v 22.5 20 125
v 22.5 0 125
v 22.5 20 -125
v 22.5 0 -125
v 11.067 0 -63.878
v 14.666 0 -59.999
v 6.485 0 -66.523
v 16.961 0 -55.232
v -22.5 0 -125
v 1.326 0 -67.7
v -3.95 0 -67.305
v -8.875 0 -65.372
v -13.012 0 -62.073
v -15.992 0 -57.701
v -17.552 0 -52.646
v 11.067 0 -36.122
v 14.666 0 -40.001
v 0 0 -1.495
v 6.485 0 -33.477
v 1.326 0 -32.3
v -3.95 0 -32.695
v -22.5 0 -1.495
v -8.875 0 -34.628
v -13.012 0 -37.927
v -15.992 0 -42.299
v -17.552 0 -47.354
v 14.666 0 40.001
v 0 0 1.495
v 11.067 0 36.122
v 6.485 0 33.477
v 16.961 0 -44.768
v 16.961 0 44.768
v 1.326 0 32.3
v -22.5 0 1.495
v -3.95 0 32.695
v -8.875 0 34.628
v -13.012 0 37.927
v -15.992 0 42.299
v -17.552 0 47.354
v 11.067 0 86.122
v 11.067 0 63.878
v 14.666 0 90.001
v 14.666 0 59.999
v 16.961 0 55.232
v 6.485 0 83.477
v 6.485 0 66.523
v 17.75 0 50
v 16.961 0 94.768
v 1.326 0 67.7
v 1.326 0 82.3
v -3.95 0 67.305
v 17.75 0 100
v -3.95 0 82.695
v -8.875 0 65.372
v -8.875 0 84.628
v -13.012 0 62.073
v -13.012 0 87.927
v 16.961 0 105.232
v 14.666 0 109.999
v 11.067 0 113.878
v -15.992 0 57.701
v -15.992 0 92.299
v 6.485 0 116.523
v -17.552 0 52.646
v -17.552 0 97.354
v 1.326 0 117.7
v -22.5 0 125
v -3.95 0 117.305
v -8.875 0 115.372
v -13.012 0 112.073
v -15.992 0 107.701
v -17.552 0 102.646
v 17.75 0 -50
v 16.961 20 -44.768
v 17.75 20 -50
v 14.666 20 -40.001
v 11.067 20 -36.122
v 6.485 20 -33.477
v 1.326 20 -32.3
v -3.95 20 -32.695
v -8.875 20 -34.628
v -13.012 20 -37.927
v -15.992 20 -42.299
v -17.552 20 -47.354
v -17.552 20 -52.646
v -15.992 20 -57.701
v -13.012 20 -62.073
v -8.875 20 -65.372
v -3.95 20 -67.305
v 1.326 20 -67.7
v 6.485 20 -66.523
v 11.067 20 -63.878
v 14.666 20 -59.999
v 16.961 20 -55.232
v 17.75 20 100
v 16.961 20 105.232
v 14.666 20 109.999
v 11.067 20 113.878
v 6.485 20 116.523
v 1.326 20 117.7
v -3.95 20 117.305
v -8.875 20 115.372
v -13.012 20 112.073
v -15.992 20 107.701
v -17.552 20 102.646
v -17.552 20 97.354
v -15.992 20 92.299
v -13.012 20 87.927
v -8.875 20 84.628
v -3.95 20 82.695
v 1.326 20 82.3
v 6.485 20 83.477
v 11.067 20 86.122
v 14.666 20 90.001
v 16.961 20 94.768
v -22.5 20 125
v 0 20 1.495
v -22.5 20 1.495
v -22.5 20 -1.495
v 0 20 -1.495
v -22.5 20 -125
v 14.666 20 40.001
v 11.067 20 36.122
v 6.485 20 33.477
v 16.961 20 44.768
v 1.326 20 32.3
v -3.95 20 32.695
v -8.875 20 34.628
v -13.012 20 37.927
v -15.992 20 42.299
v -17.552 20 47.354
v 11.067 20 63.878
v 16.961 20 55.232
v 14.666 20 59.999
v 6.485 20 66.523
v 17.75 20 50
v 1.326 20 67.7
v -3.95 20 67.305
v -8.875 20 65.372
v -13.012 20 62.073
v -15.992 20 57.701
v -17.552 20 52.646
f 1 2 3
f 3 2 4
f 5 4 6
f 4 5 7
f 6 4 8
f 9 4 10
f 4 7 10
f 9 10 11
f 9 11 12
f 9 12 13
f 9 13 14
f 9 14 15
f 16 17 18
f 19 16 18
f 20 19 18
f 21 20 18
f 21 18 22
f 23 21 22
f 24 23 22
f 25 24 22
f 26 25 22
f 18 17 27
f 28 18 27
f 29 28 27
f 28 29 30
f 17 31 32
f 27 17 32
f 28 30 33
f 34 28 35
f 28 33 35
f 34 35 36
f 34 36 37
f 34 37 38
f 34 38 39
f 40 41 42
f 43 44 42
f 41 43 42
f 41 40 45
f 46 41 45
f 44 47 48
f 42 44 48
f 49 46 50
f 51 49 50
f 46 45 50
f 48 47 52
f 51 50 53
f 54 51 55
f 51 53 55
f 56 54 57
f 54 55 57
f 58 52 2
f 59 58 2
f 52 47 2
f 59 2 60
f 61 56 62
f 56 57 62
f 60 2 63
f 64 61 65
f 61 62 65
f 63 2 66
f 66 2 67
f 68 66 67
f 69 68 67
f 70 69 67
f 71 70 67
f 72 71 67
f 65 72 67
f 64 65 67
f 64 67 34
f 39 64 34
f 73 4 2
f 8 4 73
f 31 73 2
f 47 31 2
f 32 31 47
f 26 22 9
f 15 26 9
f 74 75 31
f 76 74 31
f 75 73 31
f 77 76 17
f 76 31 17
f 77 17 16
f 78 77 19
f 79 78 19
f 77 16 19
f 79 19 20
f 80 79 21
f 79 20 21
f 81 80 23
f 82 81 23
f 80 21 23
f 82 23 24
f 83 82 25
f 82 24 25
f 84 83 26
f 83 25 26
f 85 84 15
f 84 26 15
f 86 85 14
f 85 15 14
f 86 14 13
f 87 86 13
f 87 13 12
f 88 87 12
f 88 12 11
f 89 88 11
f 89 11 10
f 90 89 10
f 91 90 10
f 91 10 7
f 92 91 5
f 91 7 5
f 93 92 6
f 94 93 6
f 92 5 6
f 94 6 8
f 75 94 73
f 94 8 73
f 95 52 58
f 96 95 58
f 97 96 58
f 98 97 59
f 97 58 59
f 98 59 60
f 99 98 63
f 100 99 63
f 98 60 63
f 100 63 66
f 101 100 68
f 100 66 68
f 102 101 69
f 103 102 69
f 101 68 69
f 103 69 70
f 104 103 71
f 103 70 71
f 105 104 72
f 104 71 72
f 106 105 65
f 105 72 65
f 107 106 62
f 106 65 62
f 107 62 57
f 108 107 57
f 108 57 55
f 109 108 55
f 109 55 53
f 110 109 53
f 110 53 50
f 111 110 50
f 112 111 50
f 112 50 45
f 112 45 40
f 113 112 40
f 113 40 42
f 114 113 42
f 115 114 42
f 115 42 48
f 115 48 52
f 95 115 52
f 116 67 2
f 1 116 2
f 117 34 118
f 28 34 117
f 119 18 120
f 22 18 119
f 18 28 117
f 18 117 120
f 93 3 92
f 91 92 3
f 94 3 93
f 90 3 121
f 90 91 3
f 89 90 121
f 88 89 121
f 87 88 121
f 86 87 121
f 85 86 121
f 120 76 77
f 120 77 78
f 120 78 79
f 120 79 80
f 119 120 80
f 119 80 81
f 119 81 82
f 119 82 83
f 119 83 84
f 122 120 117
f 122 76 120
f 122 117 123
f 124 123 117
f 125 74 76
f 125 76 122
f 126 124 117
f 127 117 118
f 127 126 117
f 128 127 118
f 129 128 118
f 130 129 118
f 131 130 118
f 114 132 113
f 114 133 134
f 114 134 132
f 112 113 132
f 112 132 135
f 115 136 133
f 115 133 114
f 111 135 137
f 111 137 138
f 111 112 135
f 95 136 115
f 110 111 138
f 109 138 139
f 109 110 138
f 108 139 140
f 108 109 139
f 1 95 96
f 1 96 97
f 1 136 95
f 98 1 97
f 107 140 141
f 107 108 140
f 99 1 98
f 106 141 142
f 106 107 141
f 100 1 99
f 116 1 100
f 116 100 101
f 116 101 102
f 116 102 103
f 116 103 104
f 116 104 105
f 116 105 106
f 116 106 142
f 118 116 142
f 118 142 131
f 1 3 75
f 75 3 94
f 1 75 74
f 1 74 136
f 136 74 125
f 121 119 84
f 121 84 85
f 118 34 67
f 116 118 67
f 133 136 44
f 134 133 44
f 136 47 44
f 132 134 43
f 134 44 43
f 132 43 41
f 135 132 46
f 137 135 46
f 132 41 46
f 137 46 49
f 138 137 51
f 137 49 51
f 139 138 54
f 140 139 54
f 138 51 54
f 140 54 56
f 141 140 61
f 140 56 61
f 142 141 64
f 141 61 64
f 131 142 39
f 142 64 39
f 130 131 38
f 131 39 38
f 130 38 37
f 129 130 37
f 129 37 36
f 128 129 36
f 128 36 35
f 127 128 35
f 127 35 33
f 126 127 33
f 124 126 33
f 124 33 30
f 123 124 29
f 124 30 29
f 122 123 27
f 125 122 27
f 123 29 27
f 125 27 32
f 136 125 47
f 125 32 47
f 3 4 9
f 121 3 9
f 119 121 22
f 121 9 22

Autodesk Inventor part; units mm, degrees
ref_plane "YZ Plane" through (0, 0, 0) normal (1, 0, 0) x (0, 1, 0)
ref_plane "XZ Plane" through (0, 0, 0) normal (0, 1, 0) x (-1, 0, 0)
ref_plane "XY Plane" through (0, 0, 0) normal (0, 0, 1) x (1, 0, 0)
sketch "Sketch1" plane through (0, 0, 0) normal (0, 1, 0) x (-1, 0, 0)
  line L0 (22.5, 125) -> (-22.5, 125)
  line L1 (-22.5, 125) -> (-22.5, -125)
  line L2 (-22.5, -125) -> (22.5, -125)
  line L3 (22.5, -125) -> (22.5, 125)
  line L4 (22.5, 125) -> (-22.5, -125) construction
  line L5 (-22.5, 125) -> (22.5, -125) construction
  point P0 (0, 0)
  dimension "d0" = 250
  dimension "d1" = 45
extrude "Extrusion1" add sketch "Sketch1" along normal blind 20
sketch "Sketch2" plane through (0, 0, 0) normal (0, -1, 0) x (1, 0, 0)
  circle A0 centre (0, 100) radius 17.75
  circle A1 centre (0, 50) radius 17.75
  circle A2 centre (0, -50) radius 17.75
  line L0 (0, 50) -> (0, -50) construction
  line L1 (0, 100) -> (0, 50) construction
  line L2 (0, 0) -> (0, 148) construction
  line L3 (-35.7491, 0) -> (26.8031, 0) construction
  line L4 (0, -1.495) -> (-22.5, -1.495)
  line L5 (-22.5, -1.495) -> (-22.5, 1.495)
  line L6 (-22.5, 1.495) -> (0, 1.495)
  line L7 (0, 1.495) -> (0, -1.495)
  line L8 (0, -1.495) -> (-22.5, 1.495) construction
  line L9 (-22.5, -1.495) -> (0, 1.495) construction
  line L10 (-18, 98) -> (-18, -100) projected
  line L11 (-22.5, 125) -> (22.5, 125) projected
  line L12 (-22.5, -125) -> (-22.5, 125) projected
  point P0 (0, 75)
  point P1 (-11.5, 0)
  point P2 (-11.25, 0)
  point P3 (-25, -148)
  point P4 (-16, 100)
  dimension "d9" = 35.5
  dimension "d10" = 35.5
  dimension "d11" = 35.5
  dimension "d12" = 50
  dimension "d13" = 100
  dimension "d16" = 2.99
  dimension "d36" = 25
extrude "Extrusion5" cut sketch "Sketch2" against normal through all
equation "\"d9\" = d11"
equation "\"d10\" = d11"
equation "\"d13\" = 2 * d12"
properties part number "stand3" material "Wood (Walnut)"
